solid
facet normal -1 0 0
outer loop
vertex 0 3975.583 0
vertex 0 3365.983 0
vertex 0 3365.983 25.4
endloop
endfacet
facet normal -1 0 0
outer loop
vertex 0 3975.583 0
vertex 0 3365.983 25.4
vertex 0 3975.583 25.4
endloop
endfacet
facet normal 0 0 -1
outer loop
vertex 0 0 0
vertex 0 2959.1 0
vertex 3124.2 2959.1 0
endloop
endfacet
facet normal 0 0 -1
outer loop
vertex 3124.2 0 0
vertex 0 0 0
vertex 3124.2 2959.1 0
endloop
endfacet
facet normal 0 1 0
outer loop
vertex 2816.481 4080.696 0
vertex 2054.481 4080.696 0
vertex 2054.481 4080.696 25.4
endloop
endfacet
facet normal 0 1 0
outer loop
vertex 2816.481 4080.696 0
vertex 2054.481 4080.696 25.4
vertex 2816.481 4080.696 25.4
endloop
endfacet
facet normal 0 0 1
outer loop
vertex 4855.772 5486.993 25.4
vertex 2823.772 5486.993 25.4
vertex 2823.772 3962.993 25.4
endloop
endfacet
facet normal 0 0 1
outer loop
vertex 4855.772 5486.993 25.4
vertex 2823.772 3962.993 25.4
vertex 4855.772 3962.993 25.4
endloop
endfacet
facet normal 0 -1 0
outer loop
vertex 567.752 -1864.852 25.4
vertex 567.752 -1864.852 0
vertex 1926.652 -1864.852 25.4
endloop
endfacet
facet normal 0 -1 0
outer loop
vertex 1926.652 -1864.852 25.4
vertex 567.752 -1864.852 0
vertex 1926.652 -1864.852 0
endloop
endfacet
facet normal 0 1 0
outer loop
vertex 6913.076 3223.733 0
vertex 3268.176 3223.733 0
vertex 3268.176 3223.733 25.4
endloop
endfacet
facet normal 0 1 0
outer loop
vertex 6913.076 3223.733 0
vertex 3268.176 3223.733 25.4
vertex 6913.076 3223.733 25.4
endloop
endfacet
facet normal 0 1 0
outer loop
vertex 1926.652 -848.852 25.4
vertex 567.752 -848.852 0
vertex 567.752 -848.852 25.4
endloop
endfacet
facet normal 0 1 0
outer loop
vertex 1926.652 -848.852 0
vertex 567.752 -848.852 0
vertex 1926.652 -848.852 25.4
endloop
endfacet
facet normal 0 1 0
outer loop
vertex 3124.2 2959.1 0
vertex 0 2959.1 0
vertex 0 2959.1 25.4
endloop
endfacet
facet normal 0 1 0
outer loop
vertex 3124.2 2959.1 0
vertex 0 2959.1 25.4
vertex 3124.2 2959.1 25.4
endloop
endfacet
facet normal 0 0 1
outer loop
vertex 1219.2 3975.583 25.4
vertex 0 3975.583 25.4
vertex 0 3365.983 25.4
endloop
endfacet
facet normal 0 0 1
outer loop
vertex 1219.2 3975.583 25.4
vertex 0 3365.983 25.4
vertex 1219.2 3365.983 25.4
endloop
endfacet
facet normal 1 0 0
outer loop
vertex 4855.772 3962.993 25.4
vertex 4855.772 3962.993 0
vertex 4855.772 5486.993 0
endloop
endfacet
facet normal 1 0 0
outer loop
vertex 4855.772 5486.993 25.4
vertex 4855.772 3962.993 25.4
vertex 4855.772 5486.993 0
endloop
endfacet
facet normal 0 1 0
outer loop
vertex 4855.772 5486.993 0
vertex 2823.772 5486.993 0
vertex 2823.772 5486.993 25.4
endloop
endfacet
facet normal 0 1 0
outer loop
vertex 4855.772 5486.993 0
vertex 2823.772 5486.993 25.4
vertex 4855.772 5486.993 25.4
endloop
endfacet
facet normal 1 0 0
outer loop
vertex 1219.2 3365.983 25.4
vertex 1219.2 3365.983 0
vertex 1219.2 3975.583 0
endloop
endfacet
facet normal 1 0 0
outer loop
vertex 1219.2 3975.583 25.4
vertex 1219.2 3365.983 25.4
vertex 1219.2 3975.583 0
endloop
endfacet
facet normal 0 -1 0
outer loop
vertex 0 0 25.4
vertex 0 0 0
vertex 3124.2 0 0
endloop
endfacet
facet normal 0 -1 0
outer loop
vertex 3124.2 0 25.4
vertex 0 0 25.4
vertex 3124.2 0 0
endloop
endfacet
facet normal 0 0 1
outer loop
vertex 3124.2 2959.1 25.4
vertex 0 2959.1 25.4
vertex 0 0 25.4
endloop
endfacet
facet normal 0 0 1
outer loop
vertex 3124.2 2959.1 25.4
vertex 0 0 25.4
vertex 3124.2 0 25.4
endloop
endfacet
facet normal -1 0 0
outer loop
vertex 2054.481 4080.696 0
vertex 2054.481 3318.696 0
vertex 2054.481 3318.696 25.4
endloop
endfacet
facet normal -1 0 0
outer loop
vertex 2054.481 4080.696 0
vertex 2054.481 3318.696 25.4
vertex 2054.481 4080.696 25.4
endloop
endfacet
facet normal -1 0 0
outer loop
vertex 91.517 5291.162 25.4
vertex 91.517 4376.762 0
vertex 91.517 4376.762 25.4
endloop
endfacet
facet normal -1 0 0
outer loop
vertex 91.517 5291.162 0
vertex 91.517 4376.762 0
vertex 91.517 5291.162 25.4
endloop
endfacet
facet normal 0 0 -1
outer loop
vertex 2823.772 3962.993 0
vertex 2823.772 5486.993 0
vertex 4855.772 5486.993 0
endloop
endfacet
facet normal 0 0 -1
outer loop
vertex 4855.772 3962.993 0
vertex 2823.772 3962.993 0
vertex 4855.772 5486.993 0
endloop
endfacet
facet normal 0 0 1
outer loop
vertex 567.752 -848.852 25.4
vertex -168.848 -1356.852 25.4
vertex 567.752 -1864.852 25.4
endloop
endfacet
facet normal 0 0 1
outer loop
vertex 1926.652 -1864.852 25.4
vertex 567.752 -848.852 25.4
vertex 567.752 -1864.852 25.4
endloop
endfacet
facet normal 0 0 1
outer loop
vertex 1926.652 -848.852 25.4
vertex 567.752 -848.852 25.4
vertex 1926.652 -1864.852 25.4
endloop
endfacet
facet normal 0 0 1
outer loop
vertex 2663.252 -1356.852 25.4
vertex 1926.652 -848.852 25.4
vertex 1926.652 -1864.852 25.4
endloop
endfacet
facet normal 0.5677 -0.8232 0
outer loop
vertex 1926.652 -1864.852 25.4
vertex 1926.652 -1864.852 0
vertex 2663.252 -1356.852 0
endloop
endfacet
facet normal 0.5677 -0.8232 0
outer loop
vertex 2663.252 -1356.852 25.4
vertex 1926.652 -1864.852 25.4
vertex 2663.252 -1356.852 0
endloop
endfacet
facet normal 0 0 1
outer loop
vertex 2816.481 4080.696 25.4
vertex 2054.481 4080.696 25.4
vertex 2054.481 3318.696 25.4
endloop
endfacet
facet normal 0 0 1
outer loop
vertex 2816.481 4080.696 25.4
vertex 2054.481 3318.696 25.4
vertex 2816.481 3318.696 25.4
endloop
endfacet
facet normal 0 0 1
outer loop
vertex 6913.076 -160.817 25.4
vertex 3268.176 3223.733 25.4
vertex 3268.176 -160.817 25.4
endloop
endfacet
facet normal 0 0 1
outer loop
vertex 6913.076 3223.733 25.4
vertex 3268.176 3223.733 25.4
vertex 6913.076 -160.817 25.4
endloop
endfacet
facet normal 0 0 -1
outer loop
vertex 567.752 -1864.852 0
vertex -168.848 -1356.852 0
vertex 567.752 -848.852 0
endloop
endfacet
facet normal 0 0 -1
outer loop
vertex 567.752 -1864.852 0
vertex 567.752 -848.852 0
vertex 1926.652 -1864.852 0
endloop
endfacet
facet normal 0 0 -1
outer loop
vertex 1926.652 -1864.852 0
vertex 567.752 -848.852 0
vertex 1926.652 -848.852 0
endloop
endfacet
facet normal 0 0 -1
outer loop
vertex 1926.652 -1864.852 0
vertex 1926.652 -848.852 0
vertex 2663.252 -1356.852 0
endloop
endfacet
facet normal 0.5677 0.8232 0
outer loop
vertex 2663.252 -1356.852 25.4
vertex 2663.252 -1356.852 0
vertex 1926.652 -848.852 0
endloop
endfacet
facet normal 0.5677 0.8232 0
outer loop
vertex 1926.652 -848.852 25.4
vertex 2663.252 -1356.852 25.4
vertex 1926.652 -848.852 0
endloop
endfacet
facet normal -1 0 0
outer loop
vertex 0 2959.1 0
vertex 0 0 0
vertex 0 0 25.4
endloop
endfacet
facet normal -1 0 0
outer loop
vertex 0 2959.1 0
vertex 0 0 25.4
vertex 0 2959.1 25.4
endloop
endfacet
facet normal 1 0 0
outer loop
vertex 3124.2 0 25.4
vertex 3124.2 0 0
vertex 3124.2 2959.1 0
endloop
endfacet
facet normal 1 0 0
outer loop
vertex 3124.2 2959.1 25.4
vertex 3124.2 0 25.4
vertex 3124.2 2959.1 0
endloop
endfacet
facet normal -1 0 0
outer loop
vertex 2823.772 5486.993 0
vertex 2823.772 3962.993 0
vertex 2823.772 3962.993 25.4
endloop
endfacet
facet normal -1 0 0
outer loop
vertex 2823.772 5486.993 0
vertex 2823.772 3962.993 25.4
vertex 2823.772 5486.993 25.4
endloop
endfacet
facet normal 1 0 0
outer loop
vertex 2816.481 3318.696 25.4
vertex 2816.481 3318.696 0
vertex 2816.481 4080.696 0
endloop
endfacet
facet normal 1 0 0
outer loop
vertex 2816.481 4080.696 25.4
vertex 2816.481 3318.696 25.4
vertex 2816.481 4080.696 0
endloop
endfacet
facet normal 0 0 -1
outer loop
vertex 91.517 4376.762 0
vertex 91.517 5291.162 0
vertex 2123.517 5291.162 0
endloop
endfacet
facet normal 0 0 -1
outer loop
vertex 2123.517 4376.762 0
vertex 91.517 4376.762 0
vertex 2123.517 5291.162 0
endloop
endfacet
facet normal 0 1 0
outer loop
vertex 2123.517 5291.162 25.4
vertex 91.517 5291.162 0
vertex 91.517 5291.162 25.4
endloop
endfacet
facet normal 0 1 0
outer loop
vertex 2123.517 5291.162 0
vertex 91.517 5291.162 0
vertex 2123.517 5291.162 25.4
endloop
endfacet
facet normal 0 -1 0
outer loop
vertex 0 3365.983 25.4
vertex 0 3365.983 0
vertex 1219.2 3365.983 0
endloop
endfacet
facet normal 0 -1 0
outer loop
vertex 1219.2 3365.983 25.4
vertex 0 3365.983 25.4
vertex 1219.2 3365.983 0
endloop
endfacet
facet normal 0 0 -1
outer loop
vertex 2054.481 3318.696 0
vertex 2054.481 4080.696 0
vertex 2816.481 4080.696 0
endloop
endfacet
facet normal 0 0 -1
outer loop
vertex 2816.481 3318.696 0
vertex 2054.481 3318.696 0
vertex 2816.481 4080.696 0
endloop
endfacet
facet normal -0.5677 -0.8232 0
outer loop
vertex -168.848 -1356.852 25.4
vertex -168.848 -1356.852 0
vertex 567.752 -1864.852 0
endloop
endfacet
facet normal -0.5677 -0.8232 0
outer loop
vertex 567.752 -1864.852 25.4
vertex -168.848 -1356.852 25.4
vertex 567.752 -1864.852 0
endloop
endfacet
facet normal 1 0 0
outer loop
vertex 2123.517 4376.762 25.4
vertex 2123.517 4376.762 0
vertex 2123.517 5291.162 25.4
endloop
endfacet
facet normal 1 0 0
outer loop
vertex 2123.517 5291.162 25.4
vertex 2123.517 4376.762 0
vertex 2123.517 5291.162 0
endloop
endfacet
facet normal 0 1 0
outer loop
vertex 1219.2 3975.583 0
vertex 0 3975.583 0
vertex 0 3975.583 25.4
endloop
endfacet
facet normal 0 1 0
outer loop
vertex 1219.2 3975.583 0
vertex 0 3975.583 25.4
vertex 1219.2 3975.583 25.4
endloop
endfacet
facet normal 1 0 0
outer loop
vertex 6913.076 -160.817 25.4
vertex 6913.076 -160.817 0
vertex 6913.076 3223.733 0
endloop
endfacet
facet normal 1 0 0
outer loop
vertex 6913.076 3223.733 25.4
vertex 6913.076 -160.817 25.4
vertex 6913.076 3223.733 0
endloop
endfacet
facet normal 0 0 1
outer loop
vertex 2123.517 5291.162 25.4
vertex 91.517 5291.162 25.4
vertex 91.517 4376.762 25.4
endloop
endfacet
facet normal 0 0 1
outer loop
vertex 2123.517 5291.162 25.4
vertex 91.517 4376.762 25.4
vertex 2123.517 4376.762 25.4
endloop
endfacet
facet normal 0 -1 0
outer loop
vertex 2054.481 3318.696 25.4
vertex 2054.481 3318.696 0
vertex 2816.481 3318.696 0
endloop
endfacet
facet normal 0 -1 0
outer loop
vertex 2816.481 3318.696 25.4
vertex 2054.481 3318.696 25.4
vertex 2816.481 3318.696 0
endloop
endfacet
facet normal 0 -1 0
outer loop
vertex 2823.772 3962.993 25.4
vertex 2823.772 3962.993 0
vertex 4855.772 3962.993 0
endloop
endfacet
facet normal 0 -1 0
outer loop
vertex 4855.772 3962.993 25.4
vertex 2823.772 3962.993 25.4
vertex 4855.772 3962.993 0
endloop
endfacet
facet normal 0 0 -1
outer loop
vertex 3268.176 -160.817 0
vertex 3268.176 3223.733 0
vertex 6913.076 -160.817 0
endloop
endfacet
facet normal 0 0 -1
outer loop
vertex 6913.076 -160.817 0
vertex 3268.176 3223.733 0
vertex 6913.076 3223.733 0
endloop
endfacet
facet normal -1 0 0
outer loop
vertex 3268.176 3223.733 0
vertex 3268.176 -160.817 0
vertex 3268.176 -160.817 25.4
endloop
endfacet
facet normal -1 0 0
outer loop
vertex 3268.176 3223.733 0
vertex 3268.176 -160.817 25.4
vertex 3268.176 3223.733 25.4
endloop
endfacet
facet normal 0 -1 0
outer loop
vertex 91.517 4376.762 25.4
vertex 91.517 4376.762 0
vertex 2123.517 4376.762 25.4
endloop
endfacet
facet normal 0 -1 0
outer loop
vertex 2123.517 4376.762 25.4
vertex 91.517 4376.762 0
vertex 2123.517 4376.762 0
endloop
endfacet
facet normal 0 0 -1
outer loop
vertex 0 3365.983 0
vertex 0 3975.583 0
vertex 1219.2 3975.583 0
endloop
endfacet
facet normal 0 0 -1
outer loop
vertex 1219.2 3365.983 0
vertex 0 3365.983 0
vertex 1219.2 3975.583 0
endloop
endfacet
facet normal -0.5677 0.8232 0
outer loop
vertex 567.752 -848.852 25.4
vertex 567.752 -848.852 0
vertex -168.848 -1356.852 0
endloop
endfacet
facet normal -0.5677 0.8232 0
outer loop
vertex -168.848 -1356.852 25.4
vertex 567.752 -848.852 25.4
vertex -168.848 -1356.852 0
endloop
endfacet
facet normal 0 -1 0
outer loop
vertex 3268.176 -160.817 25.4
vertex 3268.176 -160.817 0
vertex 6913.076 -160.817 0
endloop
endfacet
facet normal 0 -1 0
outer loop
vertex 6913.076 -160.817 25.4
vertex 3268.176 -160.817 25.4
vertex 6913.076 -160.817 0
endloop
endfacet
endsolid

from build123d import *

# Parameters (mm, degrees)
F0_W      = 3124.2
F0_H      = 2959.1
F1_DEPTH  = 25.4
F2_W      = 3644.9
F2_H      = 3384.55
F3_DEPTH  = 25.4
F4_W      = 1358.9
F4_H      = 1016
F5_DEPTH  = 25.4
F6_W      = 1219.2
F6_H      = 609.6
F7_DEPTH  = 25.4
F8_W      = 2032
F8_H      = 914.4
F9_DEPTH  = 25.4
F10_W     = 762
F10_H     = 762
F11_DEPTH = 25.4
F12_W     = 2032
F12_H     = 1524
F13_DEPTH = 25.4


with BuildPart() as f1:
    # F0 (on Top) → F1 (new body)
    with BuildSketch(Plane.XY):
        with Locations((1562.1, 1479.55)):
            Rectangle(F0_W, F0_H)
    extrude(amount=F1_DEPTH)


with BuildPart() as f3:
    # F2 (on Top) → F3 (new body)
    with BuildSketch(Plane.XY):
        with Locations((5090.62584, 1531.457749)):
            Rectangle(F2_W, F2_H)
    extrude(amount=F3_DEPTH)


with BuildPart() as f5:
    # F4 (on Top) → F5 (new body)
    with BuildSketch(Plane.XY):
        with Locations((1247.202193, -1356.852071)):
            Rectangle(F4_W, F4_H)
        Polygon((567.752193, -1864.852071), (567.752193, -848.852071), (-168.847807, -1356.852071), align=None)
        Polygon((2663.252193, -1356.852071), (1926.652193, -848.852071), (1926.652193, -1864.852071), align=None)
    extrude(amount=F5_DEPTH)


with BuildPart() as f7:
    # F6 (on Top) → F7 (new body)
    with BuildSketch(Plane.XY):
        with Locations((609.6, 3670.783486)):
            Rectangle(F6_W, F6_H)
    extrude(amount=F7_DEPTH)


with BuildPart() as f9:
    # F8 (on Top) → F9 (new body)
    with BuildSketch(Plane.XY):
        with Locations((1107.516957, 4833.961913)):
            Rectangle(F8_W, F8_H)
    extrude(amount=F9_DEPTH)


with BuildPart() as f11:
    # F10 (on Top) → F11 (new body)
    with BuildSketch(Plane.XY):
        with Locations((2435.481352, 3699.695545)):
            Rectangle(F10_W, F10_H)
    extrude(amount=F11_DEPTH)


with BuildPart() as f13:
    # F12 (on Top) → F13 (new body)
    with BuildSketch(Plane.XY):
        with Locations((3839.771542, 4724.992907)):
            Rectangle(F12_W, F12_H)
    extrude(amount=F13_DEPTH)


solid = Compound([f1.part, f3.part, f5.part, f7.part, f9.part, f11.part, f13.part])
